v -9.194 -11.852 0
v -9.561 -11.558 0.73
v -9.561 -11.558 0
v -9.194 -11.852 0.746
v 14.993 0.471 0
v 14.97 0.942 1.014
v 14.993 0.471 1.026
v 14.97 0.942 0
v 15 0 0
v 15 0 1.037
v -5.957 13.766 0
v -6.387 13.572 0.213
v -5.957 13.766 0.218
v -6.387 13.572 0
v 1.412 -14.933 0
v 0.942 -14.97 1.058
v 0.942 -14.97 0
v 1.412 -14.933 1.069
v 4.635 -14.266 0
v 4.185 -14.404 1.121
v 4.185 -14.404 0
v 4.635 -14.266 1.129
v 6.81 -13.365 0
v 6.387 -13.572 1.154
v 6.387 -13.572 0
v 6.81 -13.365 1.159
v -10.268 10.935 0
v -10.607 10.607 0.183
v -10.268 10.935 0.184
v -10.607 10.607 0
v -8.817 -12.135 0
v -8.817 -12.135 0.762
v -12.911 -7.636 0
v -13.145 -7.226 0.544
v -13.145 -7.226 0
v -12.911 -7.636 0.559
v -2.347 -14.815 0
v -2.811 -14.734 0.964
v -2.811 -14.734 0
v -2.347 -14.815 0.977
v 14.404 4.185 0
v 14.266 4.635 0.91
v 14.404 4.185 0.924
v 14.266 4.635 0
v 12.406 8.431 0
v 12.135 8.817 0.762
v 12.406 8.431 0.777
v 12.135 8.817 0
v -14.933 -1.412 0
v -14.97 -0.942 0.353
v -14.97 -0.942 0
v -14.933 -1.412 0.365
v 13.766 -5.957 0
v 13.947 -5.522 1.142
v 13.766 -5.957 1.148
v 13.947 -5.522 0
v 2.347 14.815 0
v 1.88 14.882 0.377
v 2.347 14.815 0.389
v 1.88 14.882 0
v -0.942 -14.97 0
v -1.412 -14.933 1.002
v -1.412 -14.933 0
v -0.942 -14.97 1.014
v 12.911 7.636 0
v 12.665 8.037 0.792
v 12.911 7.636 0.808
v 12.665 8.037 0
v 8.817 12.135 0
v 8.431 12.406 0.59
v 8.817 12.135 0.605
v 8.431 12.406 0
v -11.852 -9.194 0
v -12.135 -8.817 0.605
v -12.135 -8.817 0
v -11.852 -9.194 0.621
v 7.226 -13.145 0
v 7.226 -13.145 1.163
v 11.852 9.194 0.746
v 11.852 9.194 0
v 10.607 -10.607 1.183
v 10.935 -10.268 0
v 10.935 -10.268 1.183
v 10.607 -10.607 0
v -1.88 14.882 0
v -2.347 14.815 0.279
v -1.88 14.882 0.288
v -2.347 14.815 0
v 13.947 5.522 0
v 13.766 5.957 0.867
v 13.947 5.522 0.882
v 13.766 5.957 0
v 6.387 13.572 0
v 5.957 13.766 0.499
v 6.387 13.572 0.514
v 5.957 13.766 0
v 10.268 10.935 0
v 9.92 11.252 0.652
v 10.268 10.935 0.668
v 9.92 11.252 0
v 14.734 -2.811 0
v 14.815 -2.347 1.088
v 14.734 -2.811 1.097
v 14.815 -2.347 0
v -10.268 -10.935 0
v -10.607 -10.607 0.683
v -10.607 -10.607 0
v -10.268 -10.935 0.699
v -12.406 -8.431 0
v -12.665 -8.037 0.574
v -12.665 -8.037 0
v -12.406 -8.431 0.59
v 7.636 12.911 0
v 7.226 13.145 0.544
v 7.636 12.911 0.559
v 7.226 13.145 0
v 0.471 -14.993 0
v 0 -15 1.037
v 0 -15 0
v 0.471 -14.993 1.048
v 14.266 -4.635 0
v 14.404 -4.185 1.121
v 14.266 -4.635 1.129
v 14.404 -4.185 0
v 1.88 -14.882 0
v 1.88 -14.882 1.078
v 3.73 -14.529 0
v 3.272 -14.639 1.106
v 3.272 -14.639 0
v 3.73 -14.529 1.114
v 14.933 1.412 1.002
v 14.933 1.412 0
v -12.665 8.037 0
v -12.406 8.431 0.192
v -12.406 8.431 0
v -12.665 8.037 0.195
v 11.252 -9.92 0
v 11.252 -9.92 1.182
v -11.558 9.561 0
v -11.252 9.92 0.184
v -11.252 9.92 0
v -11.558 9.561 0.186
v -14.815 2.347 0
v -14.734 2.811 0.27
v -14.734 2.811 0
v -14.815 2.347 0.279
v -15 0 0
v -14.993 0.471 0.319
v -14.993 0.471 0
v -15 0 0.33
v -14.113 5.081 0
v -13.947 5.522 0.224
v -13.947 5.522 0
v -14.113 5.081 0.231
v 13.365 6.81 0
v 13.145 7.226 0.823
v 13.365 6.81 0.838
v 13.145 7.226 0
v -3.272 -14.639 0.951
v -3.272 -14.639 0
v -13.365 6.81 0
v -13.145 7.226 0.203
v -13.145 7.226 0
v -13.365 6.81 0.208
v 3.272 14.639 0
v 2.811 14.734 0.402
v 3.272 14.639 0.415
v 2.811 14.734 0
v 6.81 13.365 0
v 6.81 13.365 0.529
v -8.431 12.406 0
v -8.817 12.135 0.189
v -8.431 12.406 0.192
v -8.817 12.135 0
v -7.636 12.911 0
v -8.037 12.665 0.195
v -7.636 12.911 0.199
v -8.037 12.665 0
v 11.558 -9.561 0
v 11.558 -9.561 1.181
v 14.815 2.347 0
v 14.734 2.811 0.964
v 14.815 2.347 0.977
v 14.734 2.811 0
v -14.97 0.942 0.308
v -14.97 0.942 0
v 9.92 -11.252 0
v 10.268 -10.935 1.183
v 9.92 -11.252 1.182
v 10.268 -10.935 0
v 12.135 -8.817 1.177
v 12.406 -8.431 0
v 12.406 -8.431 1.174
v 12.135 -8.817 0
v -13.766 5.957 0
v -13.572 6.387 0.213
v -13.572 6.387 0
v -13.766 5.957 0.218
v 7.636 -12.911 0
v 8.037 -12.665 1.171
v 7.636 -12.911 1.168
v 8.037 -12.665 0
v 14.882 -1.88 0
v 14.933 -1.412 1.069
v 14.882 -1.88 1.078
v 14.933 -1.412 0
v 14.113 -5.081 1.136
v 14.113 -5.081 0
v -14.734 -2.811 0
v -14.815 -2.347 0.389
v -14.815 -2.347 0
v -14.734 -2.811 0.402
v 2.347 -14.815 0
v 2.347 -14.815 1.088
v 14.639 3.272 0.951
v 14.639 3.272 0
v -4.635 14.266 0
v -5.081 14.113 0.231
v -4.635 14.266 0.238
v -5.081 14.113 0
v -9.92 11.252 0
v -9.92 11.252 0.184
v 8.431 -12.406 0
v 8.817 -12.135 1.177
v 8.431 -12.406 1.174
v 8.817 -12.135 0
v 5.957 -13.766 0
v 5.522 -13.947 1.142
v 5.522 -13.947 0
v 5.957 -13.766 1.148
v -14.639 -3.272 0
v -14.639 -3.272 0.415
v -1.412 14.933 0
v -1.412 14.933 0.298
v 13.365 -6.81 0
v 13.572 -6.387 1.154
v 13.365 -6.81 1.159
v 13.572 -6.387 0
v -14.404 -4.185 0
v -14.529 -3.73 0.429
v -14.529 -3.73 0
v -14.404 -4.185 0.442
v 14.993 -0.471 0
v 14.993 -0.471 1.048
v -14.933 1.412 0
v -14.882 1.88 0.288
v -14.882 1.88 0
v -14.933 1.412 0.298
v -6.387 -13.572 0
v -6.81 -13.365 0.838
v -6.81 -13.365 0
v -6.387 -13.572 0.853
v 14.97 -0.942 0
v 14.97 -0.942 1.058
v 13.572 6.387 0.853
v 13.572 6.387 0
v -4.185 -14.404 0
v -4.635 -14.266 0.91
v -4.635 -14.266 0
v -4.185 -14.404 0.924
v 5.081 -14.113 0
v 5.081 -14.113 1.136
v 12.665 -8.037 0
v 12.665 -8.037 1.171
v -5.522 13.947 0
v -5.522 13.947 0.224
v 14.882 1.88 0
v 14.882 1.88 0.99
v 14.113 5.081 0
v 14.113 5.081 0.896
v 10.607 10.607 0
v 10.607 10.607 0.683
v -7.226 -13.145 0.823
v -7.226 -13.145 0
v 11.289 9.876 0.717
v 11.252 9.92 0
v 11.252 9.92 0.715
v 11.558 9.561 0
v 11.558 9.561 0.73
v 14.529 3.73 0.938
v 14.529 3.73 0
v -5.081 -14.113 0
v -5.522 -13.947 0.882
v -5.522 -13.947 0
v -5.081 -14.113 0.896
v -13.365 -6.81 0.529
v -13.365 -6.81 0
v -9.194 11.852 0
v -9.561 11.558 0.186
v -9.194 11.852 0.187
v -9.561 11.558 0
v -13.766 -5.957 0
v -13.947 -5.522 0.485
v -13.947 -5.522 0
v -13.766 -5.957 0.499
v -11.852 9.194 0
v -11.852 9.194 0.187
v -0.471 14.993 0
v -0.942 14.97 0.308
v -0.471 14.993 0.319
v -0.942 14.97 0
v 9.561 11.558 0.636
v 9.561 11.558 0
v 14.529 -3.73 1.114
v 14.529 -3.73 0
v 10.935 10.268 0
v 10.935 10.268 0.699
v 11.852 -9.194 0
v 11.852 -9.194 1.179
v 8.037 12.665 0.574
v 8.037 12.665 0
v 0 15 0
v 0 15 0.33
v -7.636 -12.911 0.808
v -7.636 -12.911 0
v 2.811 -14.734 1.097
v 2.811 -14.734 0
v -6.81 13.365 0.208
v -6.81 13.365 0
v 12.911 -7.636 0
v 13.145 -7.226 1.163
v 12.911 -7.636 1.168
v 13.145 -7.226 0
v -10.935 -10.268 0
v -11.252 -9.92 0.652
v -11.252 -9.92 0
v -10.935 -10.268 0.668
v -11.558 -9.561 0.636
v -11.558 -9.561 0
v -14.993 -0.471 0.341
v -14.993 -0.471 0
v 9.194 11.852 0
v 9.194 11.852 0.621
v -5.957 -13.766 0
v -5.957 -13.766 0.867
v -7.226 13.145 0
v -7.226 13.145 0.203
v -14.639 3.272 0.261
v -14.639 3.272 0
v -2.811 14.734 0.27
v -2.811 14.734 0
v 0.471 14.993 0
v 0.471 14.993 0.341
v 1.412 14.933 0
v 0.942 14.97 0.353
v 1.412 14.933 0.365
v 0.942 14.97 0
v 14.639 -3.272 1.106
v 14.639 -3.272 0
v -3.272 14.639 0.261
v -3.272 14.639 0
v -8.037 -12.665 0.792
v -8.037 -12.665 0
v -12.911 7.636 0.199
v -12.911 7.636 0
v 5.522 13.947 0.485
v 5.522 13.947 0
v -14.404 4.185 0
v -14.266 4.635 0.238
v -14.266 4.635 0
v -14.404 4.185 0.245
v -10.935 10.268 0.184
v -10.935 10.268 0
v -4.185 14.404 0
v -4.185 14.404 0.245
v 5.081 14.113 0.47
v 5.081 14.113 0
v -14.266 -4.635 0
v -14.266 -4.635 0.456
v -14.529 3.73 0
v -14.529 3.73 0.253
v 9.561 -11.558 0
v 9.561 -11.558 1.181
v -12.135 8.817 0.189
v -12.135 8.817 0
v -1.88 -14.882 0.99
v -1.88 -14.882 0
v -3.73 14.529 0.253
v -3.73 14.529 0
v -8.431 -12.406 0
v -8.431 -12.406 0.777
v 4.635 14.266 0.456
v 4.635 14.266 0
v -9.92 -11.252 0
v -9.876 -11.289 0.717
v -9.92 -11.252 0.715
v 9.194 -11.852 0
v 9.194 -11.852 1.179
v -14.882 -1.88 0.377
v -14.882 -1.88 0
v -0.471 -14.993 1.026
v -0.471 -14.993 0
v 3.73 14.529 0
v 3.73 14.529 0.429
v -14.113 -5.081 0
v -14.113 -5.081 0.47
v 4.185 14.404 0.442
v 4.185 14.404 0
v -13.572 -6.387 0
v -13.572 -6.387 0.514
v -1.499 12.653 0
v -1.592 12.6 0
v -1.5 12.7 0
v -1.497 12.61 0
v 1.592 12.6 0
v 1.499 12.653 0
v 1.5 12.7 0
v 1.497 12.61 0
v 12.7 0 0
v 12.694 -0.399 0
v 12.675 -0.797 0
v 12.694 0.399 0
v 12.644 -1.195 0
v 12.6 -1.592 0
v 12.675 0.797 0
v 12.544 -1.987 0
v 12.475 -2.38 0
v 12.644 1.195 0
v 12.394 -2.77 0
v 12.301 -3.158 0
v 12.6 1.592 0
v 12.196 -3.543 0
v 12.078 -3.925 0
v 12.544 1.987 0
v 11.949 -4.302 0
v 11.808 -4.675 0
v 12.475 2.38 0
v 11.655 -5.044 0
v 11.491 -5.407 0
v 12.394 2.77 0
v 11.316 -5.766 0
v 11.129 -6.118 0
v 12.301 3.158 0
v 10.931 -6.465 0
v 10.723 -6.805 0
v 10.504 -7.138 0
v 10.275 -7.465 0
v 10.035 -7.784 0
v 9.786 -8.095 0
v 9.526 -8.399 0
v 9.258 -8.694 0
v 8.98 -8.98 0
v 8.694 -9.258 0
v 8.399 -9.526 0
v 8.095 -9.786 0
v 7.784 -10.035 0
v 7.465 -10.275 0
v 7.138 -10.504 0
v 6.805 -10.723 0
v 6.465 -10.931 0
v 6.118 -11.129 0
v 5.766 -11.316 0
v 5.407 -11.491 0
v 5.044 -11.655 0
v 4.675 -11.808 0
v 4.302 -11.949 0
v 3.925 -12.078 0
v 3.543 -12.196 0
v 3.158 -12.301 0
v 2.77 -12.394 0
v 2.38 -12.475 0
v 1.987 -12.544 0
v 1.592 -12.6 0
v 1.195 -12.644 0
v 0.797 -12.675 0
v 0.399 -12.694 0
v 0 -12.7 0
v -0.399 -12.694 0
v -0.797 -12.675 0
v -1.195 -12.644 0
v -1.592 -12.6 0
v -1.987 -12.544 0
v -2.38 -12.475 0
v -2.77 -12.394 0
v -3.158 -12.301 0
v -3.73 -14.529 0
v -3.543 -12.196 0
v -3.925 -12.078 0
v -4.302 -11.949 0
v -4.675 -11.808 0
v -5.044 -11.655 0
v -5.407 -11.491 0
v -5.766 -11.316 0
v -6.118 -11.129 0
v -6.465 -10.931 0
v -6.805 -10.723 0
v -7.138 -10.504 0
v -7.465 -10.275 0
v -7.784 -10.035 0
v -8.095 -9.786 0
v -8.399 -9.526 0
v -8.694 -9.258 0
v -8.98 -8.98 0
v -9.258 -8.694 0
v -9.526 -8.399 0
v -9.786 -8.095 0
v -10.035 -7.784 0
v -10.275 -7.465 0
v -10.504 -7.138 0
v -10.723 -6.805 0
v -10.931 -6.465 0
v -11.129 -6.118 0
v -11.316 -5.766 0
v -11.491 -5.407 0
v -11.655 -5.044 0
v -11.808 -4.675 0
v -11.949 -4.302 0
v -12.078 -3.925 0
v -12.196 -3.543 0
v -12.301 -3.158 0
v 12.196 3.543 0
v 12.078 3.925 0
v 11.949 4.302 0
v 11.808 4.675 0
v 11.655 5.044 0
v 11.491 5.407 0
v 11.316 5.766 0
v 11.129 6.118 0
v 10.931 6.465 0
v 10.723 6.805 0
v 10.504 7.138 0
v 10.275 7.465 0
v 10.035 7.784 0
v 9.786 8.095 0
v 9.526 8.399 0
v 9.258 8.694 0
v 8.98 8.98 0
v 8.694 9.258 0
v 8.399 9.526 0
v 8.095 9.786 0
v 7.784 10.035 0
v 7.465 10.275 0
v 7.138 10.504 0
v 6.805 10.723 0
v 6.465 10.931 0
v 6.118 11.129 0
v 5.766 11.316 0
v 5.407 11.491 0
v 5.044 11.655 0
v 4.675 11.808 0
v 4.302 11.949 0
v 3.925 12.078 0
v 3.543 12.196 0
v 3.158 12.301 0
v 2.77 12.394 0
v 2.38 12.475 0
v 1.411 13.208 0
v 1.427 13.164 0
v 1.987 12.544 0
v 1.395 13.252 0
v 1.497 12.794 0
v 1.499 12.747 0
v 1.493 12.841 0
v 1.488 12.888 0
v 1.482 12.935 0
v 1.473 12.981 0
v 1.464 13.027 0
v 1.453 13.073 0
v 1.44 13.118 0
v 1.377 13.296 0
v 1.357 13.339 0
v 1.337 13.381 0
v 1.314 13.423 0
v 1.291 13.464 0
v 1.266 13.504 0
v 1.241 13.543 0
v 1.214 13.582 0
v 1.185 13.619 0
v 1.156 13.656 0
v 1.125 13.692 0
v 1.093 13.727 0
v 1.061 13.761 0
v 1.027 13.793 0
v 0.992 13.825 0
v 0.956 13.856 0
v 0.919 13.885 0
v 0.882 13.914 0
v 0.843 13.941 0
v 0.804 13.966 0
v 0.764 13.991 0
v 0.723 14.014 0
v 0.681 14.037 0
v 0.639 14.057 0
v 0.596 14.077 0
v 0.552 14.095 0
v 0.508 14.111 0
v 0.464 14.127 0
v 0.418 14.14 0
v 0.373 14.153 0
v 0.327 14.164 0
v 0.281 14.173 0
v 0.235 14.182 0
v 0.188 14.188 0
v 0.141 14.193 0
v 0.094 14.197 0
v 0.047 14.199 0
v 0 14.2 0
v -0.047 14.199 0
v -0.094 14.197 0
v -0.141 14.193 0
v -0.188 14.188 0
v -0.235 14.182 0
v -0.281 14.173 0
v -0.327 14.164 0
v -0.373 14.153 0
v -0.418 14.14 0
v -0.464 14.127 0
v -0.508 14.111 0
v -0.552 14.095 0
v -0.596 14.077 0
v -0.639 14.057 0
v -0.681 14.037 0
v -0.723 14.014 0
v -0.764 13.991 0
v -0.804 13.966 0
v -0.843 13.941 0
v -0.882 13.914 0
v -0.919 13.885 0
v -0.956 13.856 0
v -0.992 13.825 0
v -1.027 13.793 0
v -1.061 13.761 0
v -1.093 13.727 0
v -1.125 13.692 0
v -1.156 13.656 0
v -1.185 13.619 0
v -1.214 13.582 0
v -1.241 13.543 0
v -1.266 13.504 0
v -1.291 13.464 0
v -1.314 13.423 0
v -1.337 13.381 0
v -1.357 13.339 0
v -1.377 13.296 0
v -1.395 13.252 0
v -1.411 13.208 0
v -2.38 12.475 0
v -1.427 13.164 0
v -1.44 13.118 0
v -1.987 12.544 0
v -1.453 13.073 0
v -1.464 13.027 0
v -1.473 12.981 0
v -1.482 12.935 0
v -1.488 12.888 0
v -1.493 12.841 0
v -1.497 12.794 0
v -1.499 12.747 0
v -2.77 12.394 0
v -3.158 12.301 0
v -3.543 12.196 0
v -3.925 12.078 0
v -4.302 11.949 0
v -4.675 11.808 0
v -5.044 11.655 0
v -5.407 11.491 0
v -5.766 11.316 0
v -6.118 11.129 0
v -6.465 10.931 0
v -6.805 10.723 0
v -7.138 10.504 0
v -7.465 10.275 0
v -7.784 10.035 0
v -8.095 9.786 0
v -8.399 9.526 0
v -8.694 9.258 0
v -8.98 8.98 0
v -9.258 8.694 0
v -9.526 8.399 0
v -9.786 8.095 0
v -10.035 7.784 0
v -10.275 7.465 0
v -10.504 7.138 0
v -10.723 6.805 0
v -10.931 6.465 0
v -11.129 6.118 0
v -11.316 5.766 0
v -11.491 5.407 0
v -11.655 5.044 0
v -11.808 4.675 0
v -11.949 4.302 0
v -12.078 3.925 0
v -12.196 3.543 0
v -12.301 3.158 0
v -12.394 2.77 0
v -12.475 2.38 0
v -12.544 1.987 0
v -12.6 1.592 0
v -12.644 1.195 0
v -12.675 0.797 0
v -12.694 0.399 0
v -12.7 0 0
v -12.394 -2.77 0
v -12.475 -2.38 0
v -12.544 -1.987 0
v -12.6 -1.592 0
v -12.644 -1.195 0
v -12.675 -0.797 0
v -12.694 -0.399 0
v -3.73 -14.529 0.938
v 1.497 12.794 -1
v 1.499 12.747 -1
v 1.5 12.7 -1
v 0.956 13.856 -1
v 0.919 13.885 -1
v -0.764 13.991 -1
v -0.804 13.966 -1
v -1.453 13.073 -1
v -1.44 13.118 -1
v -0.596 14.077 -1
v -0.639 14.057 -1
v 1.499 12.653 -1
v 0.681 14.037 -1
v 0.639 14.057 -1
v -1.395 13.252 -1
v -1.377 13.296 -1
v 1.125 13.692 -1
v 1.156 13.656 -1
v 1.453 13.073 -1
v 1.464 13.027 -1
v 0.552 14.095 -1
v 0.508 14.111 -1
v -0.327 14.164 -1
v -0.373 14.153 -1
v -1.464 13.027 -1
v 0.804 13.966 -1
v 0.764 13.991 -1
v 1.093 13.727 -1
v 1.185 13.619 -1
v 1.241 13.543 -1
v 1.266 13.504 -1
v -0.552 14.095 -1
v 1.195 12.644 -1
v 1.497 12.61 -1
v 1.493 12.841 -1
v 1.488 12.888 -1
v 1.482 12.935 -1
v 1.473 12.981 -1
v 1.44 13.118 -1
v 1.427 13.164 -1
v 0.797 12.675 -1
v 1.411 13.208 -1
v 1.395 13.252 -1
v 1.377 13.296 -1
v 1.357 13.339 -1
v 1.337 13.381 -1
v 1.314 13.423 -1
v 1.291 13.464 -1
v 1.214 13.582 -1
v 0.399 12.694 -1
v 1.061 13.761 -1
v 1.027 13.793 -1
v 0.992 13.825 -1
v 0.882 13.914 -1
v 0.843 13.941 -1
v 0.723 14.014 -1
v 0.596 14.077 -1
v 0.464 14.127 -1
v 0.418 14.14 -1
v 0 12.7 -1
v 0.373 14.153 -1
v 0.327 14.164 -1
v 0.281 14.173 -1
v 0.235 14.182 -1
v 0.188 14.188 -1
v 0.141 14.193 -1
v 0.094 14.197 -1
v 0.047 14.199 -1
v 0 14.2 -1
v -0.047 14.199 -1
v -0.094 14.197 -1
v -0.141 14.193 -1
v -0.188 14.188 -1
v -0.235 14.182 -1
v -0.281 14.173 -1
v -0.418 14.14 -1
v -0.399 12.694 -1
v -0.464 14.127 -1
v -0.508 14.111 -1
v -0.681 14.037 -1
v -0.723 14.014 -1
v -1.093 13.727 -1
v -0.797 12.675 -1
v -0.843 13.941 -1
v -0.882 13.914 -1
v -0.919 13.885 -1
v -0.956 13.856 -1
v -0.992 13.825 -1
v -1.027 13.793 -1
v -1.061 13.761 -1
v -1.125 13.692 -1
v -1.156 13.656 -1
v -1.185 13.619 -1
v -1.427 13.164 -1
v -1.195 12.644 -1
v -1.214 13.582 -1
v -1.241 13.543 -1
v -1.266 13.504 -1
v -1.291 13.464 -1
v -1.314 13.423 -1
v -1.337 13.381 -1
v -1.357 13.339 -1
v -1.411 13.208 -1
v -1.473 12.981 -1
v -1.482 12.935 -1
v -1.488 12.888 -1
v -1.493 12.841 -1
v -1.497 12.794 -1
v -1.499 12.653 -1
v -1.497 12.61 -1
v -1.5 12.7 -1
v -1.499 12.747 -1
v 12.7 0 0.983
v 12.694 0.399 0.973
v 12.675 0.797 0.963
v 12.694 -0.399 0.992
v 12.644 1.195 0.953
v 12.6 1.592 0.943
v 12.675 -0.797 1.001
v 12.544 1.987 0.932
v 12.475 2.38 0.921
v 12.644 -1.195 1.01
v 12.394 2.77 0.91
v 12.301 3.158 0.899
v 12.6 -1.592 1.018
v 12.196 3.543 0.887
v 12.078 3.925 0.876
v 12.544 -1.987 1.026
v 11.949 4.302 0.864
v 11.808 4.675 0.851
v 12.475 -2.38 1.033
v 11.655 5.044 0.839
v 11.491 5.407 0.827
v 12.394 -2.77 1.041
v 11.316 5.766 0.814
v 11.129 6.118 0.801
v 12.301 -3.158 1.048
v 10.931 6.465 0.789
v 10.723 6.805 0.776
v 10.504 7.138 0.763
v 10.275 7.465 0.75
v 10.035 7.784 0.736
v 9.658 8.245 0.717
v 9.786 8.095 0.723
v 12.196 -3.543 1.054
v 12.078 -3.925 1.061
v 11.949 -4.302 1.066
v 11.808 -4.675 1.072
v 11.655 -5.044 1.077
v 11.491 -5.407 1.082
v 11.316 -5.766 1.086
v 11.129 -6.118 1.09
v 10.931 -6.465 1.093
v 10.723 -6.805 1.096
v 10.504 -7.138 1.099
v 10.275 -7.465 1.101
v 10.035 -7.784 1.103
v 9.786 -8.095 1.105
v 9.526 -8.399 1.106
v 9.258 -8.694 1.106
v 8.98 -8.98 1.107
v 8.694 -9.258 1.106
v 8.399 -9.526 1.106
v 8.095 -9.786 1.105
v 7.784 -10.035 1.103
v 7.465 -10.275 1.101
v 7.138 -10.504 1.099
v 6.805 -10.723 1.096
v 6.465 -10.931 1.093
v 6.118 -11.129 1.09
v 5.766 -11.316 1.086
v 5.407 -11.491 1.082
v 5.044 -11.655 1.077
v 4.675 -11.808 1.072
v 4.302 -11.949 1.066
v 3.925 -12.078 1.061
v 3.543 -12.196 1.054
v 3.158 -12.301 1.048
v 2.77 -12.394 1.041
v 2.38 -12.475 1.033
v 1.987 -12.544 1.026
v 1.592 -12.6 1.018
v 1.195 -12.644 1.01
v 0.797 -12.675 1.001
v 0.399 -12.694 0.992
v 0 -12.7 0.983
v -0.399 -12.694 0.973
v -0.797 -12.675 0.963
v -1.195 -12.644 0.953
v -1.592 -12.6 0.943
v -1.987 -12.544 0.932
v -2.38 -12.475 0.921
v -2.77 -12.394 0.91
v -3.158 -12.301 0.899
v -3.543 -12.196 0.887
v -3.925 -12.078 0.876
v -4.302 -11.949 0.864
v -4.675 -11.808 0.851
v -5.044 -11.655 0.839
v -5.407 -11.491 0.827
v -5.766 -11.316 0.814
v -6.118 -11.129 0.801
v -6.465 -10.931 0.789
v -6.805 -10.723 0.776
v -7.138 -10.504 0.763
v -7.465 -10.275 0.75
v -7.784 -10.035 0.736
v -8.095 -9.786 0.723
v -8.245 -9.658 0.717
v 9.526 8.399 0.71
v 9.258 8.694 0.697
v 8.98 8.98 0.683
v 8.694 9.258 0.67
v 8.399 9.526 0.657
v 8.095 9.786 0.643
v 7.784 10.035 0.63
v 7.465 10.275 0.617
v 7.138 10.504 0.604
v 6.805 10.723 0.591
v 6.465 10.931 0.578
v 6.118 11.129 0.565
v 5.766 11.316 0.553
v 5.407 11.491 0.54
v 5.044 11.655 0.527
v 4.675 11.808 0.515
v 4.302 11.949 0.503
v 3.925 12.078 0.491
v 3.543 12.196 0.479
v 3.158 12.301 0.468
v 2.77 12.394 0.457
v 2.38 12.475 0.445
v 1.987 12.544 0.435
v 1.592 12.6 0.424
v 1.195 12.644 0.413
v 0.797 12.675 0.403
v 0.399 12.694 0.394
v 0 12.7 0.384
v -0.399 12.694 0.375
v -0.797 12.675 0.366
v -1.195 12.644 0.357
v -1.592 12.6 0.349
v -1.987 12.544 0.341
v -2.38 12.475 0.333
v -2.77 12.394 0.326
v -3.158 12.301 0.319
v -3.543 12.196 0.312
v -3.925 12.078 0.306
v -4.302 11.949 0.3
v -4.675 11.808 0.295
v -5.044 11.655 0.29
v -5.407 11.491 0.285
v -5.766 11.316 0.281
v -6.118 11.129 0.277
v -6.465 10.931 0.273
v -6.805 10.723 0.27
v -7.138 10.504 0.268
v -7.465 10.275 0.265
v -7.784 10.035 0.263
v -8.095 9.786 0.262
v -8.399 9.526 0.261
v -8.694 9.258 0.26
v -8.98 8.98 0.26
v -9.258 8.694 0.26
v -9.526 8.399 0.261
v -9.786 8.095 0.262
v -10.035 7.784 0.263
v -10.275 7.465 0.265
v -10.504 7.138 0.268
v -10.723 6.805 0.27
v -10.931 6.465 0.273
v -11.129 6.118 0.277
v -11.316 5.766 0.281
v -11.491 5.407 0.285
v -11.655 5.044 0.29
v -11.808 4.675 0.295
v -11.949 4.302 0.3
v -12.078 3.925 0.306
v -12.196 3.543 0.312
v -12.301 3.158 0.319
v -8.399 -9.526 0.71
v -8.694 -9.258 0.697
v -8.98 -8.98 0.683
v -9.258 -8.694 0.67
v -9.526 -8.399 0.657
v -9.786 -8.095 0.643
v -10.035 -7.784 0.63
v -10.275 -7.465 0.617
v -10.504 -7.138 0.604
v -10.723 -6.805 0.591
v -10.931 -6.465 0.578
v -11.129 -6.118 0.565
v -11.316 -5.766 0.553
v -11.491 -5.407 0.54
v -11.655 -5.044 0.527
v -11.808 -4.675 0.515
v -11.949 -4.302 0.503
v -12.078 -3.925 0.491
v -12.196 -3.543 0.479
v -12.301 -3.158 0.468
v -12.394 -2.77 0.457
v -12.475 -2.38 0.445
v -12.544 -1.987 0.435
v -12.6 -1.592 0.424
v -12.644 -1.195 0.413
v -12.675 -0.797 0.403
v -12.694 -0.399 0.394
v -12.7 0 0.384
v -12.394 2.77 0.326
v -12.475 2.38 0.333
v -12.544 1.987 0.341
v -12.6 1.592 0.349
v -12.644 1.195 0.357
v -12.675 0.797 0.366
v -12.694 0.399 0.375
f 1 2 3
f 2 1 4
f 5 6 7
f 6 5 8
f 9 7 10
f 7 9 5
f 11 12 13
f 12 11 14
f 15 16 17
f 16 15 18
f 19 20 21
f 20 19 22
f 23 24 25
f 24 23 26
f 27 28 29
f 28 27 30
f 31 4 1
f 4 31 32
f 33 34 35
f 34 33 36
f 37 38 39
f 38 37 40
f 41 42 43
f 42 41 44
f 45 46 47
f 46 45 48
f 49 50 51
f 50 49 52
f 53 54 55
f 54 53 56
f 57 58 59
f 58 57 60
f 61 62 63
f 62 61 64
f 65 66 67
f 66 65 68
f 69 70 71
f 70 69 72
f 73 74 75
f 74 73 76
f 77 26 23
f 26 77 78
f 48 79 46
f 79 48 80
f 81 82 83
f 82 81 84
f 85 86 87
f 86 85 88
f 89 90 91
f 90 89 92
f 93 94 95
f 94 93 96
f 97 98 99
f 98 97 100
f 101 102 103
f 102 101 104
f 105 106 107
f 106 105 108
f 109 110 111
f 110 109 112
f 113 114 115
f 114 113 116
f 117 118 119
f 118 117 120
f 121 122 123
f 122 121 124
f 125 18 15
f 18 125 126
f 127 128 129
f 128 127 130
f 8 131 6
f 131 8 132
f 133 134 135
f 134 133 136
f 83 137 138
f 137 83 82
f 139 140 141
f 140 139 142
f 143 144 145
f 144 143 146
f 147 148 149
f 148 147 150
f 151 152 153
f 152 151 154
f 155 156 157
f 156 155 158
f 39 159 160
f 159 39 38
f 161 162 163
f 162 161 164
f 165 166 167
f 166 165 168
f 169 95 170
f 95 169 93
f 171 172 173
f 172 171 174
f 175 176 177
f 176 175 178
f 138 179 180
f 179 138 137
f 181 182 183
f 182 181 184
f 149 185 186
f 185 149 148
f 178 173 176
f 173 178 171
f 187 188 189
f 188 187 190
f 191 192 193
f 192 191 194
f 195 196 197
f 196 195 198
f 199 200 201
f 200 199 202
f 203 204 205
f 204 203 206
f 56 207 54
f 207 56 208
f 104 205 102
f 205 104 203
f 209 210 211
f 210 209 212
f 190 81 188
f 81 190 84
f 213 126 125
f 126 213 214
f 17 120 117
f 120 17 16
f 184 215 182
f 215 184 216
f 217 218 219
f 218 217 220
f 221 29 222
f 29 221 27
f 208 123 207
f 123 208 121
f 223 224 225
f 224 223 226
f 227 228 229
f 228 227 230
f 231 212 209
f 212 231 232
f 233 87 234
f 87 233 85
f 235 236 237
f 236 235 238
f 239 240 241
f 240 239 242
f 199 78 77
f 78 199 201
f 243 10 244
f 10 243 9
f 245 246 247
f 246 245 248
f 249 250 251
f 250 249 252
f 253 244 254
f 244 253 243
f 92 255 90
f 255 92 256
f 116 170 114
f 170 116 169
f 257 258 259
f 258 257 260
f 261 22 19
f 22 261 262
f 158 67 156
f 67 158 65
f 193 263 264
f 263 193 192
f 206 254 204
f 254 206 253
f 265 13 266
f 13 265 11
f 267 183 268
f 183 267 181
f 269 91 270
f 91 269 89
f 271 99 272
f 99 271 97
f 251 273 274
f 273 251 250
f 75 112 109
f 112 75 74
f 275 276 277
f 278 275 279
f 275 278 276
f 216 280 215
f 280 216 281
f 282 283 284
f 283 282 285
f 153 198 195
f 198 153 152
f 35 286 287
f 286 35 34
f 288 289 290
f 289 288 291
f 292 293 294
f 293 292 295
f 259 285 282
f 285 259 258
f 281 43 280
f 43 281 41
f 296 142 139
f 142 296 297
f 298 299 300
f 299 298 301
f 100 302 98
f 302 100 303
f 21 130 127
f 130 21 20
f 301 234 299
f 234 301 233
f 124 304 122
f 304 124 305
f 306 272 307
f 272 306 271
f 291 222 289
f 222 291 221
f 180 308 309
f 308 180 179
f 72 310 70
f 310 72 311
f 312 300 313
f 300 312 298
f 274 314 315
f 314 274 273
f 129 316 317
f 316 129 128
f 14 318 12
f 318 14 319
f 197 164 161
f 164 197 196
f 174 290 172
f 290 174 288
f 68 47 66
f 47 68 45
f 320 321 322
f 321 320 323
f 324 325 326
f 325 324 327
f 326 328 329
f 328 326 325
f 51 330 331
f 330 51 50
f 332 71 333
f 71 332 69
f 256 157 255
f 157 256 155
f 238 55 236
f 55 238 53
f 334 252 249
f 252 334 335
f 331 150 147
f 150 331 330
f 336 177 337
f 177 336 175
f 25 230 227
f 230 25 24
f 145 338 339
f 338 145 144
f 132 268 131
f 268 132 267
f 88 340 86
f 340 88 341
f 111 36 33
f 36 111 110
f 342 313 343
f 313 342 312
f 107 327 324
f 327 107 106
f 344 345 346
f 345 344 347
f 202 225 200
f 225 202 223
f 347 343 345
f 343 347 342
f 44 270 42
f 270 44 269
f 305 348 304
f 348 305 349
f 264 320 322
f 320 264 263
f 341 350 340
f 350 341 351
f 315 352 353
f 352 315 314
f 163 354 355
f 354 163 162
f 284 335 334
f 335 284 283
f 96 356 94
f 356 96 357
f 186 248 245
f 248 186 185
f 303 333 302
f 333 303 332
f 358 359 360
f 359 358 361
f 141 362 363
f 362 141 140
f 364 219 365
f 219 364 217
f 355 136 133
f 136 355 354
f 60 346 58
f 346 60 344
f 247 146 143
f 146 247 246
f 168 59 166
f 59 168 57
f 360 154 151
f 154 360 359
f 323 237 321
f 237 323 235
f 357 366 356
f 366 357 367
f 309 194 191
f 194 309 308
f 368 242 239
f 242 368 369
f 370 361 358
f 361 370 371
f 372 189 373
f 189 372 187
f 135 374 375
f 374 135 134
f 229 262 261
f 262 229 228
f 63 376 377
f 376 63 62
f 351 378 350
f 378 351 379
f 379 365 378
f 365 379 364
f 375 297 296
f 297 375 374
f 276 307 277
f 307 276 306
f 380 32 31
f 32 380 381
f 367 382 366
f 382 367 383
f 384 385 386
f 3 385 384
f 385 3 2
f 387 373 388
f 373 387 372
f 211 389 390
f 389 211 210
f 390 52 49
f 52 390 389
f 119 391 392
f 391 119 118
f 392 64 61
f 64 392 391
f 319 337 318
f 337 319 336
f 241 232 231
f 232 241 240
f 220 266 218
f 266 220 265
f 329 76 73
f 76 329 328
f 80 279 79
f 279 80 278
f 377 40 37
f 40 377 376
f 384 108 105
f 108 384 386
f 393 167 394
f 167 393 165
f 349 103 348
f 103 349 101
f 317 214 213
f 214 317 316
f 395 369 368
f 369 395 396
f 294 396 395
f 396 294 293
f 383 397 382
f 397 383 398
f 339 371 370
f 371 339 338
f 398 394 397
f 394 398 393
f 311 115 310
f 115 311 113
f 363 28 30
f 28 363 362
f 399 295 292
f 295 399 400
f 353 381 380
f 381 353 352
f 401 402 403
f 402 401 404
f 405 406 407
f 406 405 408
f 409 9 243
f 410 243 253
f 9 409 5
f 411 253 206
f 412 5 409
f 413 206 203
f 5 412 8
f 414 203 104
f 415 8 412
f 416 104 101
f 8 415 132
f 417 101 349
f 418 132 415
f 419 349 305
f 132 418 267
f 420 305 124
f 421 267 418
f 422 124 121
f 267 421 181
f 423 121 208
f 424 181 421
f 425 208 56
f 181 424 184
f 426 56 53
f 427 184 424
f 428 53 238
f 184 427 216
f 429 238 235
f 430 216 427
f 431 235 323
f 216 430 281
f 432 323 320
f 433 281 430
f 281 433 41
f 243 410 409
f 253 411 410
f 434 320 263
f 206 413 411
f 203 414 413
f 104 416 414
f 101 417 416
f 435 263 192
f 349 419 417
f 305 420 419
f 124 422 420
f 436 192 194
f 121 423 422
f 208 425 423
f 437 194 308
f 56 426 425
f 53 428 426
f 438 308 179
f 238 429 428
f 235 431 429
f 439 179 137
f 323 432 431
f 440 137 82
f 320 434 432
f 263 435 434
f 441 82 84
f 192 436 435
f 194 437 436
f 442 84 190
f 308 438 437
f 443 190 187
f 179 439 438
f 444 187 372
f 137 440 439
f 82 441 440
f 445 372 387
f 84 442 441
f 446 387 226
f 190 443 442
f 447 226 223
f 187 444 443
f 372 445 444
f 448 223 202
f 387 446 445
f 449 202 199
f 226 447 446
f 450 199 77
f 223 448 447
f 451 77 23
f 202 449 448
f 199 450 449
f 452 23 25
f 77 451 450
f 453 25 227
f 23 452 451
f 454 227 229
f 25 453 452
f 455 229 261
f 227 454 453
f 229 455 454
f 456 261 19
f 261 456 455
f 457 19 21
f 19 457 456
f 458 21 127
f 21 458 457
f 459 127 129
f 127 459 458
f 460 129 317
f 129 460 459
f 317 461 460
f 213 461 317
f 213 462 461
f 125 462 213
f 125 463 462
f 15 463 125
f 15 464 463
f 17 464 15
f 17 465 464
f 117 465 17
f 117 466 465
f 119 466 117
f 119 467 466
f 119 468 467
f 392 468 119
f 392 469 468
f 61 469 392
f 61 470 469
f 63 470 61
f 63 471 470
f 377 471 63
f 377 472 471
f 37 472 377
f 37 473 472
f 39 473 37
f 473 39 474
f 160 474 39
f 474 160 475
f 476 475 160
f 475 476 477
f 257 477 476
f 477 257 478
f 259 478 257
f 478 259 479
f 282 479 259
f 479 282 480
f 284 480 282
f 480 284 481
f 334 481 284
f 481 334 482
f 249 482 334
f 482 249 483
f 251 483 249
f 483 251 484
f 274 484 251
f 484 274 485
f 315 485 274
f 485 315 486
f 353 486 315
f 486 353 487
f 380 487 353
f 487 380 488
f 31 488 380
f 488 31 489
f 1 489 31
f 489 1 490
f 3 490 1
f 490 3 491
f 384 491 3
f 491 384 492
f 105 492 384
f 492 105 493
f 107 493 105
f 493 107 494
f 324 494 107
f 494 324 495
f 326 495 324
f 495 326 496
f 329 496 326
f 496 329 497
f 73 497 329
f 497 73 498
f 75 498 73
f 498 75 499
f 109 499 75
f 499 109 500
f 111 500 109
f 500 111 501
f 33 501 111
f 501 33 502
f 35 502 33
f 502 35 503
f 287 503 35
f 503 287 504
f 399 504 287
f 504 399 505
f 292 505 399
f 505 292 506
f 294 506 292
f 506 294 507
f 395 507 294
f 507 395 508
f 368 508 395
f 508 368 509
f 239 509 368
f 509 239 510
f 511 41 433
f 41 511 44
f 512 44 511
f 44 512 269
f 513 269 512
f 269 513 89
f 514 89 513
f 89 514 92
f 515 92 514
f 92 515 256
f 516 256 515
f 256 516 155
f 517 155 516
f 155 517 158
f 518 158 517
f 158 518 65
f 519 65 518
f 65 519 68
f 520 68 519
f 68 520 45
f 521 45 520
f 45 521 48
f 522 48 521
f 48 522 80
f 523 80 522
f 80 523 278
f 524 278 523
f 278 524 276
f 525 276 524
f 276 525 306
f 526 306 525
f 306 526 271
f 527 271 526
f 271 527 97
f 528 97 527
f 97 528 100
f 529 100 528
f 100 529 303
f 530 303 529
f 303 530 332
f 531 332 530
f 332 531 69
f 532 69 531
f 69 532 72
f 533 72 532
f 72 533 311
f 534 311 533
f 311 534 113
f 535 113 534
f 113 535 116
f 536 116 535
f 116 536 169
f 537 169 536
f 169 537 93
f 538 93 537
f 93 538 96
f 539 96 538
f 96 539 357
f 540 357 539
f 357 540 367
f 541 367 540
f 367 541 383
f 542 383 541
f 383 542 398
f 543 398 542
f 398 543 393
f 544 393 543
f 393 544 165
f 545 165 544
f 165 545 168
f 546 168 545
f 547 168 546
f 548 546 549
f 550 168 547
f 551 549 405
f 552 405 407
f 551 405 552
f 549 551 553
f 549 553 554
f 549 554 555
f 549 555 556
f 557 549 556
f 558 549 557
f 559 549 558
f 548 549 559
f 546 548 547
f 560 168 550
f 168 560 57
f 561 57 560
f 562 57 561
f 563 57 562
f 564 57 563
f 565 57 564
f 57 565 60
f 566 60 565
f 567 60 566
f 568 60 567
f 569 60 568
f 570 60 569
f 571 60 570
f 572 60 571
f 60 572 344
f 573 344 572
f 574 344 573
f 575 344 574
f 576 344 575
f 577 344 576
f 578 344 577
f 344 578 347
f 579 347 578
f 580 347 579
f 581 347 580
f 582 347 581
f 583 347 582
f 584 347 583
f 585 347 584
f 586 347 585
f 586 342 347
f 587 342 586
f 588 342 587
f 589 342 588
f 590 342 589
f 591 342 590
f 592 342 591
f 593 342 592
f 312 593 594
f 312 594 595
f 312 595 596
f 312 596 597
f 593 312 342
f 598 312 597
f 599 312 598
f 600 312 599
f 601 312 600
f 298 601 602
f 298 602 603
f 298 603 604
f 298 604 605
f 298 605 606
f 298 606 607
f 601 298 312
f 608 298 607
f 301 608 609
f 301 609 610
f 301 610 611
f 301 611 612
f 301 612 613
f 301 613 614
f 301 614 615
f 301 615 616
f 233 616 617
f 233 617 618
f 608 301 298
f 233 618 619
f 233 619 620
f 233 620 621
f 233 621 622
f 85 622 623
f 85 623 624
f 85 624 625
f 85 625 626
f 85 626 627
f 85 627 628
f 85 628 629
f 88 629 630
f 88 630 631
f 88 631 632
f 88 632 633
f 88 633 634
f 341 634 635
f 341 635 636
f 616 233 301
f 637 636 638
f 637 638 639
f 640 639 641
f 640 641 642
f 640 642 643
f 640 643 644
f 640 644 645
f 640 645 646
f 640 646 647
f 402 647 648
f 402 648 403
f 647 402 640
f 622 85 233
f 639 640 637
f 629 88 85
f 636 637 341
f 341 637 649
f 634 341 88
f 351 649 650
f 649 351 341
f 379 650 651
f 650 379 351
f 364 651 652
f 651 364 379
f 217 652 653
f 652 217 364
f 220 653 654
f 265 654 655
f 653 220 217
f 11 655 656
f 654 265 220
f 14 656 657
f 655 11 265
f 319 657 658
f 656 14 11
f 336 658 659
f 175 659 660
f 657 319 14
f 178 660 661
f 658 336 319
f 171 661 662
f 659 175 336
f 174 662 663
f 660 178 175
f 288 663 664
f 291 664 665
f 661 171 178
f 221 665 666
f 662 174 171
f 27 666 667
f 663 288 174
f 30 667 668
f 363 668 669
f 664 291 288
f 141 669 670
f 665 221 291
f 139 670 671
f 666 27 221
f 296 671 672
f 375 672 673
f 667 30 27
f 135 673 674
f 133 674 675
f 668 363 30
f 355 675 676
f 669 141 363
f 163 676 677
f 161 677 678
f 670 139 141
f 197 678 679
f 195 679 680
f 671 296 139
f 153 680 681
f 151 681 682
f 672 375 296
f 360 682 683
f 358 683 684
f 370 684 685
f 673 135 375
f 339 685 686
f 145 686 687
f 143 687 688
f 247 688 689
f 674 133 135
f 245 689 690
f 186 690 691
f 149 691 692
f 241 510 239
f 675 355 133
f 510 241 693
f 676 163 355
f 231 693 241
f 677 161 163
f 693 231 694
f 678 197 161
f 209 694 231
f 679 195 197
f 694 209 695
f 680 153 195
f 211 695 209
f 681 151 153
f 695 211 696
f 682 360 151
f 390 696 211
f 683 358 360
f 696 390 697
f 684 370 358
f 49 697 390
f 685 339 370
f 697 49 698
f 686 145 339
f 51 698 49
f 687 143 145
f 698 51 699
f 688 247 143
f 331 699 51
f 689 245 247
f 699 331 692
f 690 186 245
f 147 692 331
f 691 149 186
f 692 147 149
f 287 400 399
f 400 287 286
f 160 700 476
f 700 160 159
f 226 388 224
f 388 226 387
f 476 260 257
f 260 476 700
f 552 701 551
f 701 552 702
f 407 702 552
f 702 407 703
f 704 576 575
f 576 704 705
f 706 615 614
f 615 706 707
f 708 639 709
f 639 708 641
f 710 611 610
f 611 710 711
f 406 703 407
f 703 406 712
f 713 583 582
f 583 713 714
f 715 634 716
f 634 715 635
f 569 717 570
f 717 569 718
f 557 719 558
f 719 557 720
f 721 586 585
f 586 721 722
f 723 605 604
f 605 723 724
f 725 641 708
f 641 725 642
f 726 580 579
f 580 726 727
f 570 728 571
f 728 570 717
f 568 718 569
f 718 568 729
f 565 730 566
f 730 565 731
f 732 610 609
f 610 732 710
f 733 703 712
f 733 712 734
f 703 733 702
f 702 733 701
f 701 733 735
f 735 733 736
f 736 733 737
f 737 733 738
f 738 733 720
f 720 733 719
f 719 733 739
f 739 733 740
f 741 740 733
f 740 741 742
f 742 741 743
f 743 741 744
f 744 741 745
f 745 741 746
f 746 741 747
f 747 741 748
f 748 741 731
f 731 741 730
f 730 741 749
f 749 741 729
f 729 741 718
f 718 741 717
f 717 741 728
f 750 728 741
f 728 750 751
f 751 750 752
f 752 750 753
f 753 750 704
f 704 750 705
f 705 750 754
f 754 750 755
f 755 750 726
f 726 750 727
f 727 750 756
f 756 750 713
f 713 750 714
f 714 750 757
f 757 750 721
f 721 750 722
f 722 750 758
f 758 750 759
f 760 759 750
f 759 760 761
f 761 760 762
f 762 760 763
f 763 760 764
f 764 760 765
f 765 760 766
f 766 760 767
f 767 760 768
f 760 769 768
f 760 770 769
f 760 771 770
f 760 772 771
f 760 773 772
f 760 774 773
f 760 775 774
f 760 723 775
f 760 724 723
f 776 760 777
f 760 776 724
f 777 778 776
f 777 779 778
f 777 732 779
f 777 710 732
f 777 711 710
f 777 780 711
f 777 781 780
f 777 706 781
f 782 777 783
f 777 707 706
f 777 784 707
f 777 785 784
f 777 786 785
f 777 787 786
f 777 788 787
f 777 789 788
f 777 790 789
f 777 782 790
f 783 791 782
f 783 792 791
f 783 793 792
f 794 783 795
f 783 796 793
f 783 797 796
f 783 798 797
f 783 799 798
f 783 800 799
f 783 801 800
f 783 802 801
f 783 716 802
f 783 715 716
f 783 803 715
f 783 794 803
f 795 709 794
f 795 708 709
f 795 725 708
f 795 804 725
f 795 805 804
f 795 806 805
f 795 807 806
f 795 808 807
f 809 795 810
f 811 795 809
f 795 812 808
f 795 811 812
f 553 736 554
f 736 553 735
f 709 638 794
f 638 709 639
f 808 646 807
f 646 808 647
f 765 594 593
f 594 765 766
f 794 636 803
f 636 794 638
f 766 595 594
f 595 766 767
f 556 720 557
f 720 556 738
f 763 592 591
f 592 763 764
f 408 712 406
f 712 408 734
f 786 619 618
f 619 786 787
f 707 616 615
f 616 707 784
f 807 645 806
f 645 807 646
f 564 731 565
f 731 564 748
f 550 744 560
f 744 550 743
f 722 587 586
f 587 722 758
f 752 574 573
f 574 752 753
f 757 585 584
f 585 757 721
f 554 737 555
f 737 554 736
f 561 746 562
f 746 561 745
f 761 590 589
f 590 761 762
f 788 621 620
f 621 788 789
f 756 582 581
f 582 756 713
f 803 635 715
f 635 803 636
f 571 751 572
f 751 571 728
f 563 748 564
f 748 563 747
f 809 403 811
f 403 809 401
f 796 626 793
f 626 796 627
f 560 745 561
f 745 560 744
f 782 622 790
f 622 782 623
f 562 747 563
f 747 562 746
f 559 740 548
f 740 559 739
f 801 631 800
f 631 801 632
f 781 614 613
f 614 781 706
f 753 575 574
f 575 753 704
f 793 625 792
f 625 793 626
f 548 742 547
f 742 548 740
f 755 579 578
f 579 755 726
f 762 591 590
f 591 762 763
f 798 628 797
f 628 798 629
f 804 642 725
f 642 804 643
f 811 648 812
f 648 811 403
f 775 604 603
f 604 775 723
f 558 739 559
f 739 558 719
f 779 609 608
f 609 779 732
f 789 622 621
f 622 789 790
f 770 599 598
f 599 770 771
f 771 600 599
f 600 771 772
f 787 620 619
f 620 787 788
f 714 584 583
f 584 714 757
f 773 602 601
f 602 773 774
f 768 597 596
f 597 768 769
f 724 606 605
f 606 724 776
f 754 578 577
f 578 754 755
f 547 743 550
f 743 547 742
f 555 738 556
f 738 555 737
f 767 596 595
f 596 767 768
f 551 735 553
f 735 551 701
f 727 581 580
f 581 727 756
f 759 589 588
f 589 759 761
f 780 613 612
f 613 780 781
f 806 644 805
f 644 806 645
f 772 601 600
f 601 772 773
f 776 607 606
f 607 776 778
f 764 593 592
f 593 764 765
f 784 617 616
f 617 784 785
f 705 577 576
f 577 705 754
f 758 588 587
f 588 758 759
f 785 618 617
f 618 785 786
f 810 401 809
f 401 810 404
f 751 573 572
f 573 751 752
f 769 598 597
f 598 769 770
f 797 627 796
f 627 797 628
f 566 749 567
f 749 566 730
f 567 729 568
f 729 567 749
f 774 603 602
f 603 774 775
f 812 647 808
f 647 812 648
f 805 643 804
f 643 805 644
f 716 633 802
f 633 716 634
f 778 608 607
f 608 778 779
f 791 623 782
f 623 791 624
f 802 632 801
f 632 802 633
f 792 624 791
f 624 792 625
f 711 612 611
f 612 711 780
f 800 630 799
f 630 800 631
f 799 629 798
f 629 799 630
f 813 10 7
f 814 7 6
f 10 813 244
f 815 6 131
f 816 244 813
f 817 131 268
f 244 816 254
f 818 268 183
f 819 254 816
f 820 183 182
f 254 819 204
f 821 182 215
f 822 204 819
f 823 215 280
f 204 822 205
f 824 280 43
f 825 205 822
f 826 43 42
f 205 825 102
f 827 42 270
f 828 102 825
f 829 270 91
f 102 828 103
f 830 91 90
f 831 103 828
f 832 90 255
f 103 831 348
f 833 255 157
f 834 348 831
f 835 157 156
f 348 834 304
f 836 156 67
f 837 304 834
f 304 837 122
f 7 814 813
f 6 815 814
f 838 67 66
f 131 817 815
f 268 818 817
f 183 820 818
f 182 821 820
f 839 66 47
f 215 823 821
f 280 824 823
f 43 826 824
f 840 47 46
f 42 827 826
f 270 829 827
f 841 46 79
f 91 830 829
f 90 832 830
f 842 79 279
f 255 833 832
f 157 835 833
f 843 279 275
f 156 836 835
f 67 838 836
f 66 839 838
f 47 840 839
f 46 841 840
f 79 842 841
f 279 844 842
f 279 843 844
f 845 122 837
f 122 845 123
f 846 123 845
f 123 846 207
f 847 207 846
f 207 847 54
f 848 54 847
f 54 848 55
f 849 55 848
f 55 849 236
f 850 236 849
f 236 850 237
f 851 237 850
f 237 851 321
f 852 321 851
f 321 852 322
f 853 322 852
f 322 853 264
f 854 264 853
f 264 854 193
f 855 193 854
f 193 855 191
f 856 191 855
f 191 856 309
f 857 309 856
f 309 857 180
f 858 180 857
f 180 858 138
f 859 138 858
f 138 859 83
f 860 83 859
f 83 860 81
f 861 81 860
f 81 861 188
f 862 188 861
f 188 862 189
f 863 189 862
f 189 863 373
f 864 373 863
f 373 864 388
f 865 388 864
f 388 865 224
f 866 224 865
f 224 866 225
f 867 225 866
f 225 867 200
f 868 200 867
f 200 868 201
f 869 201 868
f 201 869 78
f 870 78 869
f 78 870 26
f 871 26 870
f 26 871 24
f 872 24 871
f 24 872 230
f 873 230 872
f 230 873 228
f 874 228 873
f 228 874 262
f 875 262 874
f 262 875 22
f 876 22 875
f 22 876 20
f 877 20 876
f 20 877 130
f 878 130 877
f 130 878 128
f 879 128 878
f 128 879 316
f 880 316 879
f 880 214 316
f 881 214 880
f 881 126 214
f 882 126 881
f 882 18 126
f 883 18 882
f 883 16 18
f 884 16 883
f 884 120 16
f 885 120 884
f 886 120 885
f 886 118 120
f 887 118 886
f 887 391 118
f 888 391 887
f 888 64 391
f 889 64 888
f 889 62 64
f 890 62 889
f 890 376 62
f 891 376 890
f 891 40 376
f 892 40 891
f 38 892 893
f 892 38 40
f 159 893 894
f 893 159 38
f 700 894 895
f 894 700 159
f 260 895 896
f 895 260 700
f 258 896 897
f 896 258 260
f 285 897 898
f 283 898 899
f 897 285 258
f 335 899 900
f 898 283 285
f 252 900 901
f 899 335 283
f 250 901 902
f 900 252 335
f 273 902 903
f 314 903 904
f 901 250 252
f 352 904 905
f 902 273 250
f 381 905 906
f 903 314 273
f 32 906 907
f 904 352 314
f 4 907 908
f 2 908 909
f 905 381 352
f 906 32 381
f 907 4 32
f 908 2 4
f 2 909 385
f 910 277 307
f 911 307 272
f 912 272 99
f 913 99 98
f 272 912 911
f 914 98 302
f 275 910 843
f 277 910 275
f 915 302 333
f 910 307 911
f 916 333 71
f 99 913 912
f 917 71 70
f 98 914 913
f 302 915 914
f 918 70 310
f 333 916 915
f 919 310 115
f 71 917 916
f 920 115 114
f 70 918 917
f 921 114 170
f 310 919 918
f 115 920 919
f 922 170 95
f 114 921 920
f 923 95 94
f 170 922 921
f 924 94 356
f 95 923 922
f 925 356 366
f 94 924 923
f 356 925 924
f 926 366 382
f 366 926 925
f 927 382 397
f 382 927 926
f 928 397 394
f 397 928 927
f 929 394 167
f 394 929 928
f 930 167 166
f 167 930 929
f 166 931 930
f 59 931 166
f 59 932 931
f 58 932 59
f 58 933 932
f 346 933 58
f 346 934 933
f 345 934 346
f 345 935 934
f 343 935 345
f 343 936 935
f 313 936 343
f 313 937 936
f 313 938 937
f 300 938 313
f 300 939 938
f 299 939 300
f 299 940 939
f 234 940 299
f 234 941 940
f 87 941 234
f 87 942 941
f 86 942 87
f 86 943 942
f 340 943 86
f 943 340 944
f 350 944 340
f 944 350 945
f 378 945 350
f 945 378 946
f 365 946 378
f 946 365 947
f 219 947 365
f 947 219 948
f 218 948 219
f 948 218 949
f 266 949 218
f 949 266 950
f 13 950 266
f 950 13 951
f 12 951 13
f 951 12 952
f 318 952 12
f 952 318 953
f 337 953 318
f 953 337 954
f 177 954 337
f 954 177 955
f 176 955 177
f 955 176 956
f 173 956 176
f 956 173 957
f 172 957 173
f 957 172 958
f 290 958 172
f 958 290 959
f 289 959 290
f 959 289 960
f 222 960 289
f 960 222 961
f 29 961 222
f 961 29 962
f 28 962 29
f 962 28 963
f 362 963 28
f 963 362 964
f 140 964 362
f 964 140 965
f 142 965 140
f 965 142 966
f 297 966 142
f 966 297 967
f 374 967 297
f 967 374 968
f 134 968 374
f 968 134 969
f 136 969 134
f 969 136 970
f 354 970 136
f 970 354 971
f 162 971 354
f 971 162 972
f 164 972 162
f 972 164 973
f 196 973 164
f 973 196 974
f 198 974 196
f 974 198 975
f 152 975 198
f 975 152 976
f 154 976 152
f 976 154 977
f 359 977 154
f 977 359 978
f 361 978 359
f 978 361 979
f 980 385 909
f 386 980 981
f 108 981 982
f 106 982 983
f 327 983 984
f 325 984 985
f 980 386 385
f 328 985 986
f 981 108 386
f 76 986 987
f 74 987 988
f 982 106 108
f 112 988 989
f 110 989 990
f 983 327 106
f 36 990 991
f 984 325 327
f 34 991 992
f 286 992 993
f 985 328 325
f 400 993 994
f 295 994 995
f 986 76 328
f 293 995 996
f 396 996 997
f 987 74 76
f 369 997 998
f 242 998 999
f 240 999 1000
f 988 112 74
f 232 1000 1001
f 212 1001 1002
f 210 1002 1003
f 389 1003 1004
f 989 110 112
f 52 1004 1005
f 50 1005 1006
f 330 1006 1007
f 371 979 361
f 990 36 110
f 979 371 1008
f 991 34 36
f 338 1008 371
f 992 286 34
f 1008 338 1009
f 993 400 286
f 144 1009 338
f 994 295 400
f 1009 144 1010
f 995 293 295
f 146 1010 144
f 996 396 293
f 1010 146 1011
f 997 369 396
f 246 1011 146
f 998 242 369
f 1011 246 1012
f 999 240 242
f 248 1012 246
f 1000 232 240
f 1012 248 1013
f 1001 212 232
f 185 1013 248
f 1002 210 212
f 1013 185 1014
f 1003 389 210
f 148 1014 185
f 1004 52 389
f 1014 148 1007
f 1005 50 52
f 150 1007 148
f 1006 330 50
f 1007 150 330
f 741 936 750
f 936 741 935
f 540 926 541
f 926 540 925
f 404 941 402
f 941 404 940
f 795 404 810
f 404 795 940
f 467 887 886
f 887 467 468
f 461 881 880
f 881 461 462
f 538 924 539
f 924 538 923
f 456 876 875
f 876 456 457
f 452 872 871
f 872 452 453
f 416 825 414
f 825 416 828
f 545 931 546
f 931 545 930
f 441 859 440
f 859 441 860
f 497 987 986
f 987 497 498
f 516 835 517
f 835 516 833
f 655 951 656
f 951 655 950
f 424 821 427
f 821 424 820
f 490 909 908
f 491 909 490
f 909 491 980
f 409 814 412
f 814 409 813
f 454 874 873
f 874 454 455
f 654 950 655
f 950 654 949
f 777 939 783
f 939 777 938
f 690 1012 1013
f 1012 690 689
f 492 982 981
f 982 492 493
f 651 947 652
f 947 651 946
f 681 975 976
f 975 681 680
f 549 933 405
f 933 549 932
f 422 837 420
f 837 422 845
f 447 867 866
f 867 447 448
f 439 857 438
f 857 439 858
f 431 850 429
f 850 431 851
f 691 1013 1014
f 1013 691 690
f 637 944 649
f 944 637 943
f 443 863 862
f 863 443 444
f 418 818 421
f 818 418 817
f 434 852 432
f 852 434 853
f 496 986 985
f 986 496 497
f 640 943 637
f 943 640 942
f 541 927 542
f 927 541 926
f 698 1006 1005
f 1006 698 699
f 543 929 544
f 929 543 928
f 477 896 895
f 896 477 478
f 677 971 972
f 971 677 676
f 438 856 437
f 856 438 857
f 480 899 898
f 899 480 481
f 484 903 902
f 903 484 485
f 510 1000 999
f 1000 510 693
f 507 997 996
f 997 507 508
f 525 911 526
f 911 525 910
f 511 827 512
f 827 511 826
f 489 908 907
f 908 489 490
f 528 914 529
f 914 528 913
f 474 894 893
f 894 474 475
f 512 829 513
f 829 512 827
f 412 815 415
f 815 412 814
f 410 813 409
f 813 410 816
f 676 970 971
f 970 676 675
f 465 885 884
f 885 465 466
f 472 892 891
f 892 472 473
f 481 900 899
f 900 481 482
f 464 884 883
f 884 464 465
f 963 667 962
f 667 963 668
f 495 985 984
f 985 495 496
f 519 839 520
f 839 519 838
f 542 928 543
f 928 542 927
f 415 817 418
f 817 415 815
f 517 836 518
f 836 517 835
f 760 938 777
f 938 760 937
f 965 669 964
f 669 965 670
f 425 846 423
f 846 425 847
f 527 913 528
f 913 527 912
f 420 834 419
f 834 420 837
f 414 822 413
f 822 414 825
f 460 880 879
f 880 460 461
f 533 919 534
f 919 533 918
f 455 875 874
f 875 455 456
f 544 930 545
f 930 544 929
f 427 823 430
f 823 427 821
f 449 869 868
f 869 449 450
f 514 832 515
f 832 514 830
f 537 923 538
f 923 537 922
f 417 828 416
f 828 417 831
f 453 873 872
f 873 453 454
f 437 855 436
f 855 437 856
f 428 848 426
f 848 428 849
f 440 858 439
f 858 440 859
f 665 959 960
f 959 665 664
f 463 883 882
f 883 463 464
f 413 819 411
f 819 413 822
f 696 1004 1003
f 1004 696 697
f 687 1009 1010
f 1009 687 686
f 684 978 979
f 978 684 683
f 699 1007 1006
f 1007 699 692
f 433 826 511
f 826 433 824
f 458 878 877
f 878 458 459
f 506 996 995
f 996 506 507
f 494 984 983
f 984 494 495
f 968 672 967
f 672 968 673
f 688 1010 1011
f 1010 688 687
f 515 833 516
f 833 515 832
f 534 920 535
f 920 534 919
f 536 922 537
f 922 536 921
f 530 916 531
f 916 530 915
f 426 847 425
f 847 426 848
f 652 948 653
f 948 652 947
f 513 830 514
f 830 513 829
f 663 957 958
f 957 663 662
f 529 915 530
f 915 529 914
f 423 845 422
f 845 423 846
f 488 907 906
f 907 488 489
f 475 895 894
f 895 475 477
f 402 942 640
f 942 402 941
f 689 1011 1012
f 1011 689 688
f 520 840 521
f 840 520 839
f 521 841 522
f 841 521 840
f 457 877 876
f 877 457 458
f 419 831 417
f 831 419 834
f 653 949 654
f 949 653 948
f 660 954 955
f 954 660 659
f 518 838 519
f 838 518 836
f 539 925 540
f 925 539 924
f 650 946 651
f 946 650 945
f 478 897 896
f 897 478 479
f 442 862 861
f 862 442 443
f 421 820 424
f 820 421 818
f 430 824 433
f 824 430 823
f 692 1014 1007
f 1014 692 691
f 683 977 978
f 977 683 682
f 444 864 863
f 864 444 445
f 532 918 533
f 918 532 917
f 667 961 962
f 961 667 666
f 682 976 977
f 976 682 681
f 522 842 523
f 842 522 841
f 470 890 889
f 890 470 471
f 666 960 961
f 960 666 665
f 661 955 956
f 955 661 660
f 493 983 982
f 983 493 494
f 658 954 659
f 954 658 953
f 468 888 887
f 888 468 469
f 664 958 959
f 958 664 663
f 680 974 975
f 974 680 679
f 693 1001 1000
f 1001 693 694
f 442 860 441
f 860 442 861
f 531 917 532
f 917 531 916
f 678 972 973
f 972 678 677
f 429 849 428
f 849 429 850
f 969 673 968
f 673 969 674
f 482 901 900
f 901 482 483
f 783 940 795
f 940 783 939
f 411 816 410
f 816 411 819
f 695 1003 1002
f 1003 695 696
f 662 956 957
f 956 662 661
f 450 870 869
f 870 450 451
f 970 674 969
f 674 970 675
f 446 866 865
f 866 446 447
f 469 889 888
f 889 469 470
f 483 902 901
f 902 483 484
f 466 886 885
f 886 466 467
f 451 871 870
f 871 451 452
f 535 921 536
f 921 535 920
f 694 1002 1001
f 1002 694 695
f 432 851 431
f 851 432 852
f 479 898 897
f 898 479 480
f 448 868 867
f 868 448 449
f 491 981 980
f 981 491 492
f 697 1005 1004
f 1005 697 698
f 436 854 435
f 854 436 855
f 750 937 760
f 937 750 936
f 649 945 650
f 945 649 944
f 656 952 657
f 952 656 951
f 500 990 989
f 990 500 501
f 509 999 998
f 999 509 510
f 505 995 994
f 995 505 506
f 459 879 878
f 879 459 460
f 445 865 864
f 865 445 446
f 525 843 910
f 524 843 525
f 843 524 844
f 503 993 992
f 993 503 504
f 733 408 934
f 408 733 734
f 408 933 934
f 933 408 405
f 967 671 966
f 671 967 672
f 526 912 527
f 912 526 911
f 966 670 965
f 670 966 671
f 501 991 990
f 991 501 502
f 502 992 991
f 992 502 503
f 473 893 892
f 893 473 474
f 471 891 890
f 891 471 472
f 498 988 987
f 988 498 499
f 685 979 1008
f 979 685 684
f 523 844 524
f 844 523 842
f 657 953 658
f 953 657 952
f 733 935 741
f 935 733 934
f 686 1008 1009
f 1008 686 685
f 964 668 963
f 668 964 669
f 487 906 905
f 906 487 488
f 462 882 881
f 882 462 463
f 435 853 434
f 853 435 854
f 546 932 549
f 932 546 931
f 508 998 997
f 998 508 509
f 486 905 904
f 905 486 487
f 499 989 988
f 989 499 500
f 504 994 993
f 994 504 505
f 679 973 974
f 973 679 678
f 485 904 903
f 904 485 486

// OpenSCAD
// file: dimensions.scad
r_outer = 30/2;
r_inner = 25.4/2;
r_registration_cutout = 1.5;
h_cutouts = 20; // Just some large number
h_ring_min = 0.2;
h_ring_max = 1.2;
h_ring_diff = h_ring_max - h_ring_min;

$fn=200;
// main file
include <dimensions.scad>

difference(){
  union(){
    cylinder(h_ring_max, r_outer, r_outer, [0,0,0]);
    translate([0,r_inner,-h_ring_diff]){
      cylinder(h_ring_diff, r_registration_cutout, r_registration_cutout, [0,0,0]);
    }
  }
  translate([0, 0, h_ring_diff/2 + h_ring_min + 2*r_outer]){
    rotate(a=-atan2(h_ring_max- h_ring_min, 2*r_outer), v = [1,1,0]){
      cube(r_outer*4, center=true);
    }
  }
  translate([0,0,-h_cutouts/2]){
    cylinder(h_cutouts, r_inner, r_inner, [0,0,0]);
  }
}
